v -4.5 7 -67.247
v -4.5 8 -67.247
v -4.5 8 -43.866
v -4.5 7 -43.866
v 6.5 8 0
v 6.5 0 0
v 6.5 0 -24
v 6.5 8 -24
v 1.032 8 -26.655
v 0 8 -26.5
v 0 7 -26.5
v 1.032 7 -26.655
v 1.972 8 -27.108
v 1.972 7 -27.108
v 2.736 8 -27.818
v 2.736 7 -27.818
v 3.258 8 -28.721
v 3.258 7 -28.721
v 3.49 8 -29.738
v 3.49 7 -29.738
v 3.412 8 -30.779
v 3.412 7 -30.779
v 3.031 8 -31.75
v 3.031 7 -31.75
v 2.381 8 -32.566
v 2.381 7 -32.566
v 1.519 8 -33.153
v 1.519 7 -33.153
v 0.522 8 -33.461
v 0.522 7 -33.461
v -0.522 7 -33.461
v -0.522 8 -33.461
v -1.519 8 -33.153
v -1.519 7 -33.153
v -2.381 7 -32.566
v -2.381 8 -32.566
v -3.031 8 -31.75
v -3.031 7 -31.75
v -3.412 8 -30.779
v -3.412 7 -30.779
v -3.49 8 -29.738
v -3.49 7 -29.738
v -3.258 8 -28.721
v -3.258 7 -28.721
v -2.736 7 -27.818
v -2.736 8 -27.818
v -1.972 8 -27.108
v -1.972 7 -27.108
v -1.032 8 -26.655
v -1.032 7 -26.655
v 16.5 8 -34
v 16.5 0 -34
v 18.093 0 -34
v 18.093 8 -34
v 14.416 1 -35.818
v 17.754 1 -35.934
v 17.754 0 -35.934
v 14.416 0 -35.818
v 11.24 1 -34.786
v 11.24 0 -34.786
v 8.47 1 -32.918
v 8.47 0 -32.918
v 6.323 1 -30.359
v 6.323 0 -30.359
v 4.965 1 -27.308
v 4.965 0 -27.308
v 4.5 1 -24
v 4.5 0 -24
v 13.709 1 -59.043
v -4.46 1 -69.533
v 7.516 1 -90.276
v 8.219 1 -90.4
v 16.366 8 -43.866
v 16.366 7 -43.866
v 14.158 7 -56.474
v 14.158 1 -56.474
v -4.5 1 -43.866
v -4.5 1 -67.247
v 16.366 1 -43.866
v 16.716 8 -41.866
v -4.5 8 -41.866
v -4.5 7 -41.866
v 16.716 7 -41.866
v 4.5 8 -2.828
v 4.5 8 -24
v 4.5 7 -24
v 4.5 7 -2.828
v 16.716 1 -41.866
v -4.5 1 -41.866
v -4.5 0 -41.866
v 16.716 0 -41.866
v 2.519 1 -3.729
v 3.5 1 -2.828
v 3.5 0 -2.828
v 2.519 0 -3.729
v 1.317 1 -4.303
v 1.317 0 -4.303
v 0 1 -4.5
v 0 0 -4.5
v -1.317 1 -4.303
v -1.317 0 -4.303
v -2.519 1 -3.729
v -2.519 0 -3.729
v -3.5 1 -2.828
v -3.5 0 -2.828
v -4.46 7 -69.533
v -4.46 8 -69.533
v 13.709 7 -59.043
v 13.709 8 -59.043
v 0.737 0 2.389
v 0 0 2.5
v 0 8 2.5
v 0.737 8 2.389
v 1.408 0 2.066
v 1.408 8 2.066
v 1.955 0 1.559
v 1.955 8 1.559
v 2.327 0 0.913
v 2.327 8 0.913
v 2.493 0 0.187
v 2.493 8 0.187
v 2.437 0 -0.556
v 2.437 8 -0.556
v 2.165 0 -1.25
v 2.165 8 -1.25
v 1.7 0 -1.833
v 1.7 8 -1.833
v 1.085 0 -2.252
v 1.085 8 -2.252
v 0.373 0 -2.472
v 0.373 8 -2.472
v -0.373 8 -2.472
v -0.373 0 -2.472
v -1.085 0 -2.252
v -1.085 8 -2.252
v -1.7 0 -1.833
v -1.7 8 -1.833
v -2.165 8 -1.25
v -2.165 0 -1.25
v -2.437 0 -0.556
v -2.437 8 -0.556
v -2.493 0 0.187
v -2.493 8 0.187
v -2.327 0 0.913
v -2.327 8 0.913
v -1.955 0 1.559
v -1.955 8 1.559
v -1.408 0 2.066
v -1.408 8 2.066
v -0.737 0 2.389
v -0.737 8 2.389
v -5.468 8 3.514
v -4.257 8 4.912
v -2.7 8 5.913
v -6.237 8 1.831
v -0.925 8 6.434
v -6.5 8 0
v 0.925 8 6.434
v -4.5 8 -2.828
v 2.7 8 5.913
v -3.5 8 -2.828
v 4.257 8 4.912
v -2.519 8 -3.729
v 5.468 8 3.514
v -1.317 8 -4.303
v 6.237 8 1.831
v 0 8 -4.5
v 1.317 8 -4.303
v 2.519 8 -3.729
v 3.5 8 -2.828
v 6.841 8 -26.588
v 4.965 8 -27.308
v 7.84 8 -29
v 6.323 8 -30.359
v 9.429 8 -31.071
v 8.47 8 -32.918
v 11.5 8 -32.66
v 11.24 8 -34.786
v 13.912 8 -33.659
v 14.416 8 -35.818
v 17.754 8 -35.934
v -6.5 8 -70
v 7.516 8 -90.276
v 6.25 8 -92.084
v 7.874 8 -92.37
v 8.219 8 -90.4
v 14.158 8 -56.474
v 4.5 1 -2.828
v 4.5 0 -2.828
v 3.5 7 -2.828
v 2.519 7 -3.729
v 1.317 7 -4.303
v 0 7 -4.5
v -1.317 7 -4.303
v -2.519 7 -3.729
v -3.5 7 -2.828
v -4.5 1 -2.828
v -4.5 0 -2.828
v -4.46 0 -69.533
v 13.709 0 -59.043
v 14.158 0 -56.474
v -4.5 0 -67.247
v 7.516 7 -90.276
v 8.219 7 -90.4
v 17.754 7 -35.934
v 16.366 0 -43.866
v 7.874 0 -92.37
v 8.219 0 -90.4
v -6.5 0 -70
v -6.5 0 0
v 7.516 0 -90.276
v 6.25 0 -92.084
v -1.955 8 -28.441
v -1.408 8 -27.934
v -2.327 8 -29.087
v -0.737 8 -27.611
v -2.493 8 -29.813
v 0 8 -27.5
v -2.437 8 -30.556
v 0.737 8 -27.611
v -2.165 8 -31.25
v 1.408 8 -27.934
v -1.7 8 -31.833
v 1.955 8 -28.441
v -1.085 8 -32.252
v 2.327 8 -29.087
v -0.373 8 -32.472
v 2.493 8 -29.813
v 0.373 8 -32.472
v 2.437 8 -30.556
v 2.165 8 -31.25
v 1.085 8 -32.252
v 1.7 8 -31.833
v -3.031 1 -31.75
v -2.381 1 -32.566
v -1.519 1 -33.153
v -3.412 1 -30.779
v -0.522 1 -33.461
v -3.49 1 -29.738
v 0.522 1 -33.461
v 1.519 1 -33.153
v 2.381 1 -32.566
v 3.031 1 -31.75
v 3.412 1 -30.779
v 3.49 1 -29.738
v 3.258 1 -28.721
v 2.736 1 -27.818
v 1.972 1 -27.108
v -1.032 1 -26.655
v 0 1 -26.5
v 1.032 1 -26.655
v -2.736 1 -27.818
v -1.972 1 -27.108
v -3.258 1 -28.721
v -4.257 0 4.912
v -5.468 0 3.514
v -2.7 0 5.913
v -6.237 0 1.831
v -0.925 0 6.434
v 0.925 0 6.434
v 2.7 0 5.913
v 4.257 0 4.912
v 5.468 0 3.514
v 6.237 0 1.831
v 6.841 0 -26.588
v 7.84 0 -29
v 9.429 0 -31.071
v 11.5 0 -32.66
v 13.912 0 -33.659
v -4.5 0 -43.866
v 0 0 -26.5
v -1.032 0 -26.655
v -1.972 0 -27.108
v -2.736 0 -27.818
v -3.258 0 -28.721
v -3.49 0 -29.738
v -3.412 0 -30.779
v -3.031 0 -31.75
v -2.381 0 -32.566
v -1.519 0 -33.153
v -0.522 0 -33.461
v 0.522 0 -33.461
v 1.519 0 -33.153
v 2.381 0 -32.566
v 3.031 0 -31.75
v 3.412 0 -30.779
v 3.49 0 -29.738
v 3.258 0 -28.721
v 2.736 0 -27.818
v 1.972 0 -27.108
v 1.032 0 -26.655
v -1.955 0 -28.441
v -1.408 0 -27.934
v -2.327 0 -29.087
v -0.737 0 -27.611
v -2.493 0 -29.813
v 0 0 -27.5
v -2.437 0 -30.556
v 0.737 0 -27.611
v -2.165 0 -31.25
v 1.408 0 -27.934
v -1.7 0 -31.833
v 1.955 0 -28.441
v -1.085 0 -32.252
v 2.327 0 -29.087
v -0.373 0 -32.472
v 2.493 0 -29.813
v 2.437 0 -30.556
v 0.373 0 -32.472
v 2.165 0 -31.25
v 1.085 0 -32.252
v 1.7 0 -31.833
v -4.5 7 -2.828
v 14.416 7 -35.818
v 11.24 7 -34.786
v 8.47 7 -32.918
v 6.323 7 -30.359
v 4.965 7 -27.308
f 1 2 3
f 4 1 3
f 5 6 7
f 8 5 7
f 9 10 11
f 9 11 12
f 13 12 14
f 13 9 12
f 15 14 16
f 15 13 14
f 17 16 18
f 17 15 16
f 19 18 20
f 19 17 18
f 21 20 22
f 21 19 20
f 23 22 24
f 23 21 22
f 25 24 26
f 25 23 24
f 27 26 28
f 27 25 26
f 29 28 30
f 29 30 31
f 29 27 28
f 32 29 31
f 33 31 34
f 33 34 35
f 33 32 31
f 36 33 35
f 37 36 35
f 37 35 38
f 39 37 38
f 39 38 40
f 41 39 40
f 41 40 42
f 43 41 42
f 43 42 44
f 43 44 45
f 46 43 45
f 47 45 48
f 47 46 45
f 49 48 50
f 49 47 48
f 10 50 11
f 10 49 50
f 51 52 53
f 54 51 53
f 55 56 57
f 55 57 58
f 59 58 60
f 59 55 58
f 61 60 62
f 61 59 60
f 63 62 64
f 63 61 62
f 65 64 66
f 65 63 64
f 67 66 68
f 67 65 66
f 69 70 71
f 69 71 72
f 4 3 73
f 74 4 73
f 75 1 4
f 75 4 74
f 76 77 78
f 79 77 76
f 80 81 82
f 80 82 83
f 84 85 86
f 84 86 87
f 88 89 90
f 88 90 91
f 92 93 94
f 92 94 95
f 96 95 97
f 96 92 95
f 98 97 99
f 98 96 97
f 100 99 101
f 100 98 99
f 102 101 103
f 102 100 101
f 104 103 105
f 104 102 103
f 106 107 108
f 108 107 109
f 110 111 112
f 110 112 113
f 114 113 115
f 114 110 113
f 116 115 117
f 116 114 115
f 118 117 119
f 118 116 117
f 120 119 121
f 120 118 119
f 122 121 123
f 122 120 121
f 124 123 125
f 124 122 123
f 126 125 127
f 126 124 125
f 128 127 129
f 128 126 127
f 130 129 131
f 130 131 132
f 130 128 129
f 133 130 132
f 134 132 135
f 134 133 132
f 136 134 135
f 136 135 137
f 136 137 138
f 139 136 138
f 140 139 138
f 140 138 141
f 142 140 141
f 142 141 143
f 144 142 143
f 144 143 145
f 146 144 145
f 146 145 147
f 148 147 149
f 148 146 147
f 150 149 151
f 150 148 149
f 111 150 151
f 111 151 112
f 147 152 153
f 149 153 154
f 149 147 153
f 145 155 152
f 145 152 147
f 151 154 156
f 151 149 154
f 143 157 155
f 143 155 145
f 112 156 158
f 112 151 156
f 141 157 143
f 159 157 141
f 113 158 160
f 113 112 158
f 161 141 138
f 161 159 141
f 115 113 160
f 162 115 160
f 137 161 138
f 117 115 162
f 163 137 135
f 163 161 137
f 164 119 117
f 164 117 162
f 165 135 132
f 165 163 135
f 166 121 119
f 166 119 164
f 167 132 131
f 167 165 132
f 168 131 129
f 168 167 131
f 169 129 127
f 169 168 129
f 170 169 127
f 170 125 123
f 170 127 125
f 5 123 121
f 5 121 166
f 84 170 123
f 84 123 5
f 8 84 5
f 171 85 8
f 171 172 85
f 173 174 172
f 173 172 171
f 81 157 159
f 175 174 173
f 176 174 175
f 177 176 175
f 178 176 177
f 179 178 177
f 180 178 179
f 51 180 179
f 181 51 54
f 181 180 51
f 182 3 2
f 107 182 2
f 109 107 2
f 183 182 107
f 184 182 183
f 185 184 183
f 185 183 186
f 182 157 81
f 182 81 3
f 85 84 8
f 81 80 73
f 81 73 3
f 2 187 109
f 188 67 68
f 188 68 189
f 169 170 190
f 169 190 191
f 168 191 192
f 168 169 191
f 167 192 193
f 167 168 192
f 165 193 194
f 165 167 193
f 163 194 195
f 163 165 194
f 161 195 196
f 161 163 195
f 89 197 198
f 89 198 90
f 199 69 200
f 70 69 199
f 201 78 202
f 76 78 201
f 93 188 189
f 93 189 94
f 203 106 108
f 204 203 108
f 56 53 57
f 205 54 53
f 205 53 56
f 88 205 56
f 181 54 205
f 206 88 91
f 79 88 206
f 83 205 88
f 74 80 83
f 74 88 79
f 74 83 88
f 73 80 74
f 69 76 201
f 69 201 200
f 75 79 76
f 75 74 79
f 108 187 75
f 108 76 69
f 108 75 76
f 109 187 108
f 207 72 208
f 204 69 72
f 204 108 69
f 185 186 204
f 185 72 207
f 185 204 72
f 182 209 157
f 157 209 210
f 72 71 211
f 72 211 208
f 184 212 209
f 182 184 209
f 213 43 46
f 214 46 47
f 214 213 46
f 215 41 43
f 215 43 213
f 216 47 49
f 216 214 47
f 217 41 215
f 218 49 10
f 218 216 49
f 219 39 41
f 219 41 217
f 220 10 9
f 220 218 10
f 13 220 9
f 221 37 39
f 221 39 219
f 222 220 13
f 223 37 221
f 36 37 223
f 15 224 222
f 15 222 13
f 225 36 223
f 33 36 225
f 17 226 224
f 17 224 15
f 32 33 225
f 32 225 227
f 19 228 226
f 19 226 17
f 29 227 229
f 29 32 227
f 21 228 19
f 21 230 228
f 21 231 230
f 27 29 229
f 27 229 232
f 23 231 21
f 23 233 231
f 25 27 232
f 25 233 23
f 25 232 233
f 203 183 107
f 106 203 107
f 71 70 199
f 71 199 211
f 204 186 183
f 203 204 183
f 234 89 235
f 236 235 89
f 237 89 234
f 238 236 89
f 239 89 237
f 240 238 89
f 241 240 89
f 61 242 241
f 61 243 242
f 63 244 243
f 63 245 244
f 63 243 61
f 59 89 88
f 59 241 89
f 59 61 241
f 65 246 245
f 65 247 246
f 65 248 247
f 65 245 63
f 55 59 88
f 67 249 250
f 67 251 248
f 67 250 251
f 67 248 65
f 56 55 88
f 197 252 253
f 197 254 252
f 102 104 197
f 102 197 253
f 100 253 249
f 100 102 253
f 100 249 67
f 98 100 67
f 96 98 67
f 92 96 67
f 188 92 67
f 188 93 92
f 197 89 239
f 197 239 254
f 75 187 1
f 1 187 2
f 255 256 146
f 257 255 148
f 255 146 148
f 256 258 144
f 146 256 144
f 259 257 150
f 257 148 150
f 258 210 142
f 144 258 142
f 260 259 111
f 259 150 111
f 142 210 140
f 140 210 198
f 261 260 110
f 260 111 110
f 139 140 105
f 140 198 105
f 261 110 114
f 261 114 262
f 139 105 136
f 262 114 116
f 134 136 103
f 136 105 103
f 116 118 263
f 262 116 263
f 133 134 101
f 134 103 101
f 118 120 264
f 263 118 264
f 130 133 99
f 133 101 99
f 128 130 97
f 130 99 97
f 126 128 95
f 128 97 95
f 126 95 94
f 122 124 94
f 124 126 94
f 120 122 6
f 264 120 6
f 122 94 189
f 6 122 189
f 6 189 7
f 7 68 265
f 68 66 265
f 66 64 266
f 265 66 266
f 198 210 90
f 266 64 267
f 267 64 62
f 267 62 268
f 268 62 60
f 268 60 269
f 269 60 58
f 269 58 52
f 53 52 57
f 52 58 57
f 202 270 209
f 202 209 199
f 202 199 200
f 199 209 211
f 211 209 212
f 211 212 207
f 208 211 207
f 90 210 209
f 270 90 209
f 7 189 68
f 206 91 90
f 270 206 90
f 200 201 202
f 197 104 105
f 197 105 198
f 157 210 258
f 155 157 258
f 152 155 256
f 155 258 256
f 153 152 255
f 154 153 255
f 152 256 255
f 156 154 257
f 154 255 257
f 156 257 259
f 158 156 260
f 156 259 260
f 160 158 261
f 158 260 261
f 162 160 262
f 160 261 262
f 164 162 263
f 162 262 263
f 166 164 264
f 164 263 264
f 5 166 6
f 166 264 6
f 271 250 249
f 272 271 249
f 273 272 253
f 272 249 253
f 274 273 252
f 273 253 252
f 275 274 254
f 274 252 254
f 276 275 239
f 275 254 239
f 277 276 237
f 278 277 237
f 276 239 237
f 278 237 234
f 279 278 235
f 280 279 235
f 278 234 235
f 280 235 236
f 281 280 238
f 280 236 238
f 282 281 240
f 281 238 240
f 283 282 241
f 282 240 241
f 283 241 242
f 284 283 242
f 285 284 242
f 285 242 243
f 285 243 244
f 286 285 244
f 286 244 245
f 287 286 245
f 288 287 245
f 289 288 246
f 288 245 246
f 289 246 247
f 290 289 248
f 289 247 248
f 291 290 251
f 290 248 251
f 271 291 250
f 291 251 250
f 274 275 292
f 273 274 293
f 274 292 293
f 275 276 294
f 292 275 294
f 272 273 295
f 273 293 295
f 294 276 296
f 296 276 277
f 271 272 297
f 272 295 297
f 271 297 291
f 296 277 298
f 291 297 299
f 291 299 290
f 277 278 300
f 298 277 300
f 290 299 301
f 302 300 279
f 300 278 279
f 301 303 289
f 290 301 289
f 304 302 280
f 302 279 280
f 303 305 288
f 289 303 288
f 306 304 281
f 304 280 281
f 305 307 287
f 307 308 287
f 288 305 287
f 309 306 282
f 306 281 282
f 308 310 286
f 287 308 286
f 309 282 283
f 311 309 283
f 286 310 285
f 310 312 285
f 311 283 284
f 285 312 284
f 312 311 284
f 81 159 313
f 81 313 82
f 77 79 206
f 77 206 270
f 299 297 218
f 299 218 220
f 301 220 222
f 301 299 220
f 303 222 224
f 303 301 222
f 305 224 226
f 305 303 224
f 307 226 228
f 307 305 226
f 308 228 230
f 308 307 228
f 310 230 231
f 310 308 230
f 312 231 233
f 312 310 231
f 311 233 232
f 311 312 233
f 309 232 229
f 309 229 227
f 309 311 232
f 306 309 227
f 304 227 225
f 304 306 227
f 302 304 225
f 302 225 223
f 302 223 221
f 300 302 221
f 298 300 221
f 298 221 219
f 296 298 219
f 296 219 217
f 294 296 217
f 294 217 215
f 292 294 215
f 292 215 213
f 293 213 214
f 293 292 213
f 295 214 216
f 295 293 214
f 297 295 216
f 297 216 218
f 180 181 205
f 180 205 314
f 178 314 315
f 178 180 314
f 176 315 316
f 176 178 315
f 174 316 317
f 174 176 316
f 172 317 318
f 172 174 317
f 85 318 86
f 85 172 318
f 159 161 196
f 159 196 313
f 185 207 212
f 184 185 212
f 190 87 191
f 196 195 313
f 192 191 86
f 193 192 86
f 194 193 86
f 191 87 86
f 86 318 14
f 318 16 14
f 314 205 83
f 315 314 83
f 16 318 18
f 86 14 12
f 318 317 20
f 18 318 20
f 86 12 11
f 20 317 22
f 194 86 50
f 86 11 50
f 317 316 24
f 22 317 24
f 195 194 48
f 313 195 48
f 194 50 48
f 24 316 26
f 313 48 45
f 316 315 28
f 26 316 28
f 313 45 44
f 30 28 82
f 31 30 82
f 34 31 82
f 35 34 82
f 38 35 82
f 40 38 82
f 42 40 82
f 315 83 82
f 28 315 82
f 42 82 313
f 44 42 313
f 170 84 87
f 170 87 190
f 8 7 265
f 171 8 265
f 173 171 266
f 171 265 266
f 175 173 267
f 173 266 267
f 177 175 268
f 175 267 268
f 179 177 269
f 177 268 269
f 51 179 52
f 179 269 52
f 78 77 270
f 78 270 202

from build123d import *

# Parameters (mm, degrees)
CROQUIS2_R               = 2.5
SALIENTE_EXTRUIR1_DEPTH  = 8
CROQUIS3_R               = 3.5
CORTAR_EXTRUIR1_DEPTH    = 1
CORTAR_EXTRUIR2_START    = -1
CROQUIS4_R               = 3.5
CORTAR_EXTRUIR2_DEPTH    = 1
BOSS_EXTRUDE1_DEPTH      = 10
BOSS_EXTRUDE1_DEPTH_BACK = 18
CUT_EXTRUDE1_DEPTH       = 10
CUT_EXTRUDE2_DEPTH       = 46
CUT_EXTRUDE2_DEPTH_BACK  = 31


with BuildPart() as part:
    # Croquis2 → Saliente-Extruir1 (new body)
    with BuildSketch(Plane(origin=(0, 0, 0), x_dir=(1, 0, 0), z_dir=(0, 1, 0))):
        with BuildLine():
            Line((-6.5, 70), (-6.5, 0))
            ThreePointArc((-6.5, 0), (0, -6.5), (6.5, 0))
            Line((6.5, 0), (6.5, 24))
            ThreePointArc((6.5, 24), (9.428932188, 31.071067812), (16.5, 34))
            Line((16.5, 34), (19.5, 34))
            Line((19.5, 34), (21.621320344, 36.121320344))
            Line((21.621320344, 36.121320344), (19.621320344, 38.121320344))
            Line((19.621320344, 38.121320344), (21.621320344, 40.121320344))
            Line((21.621320344, 40.121320344), (19.621320344, 42.121320344))
            Line((19.621320344, 42.121320344), (21.621320344, 44.121320344))
            ThreePointArc((21.621320344, 44.121320344), (15.831267135, 61.441250358), (13.535653981, 79.558503244))
            Line((13.535653981, 79.558503244), (11.21874212, 81.180822395))
            Line((11.21874212, 81.180822395), (12.841061271, 83.497734256))
            Line((12.841061271, 83.497734256), (10.524149409, 85.120053407))
            Line((10.524149409, 85.120053407), (12.14646856, 87.436965268))
            Line((12.14646856, 87.436965268), (9.829556699, 89.059284419))
            Line((9.829556699, 89.059284419), (11.451875849, 91.37619628))
            Line((11.451875849, 91.37619628), (11.174038765, 92.951888685))
            Line((11.174038765, 92.951888685), (6.25, 92.083647797))
            Line((6.25, 92.083647797), (-6.5, 70))
        make_face()
        with Locations(Location((0, 0, 0), (0, 0, 270))):
            Circle(CROQUIS2_R, mode=Mode.SUBTRACT)
        with Locations(Location((0, 30, 0), (0, 0, 270))):
            Circle(CROQUIS2_R, mode=Mode.SUBTRACT)
    extrude(amount=SALIENTE_EXTRUIR1_DEPTH)

    # Croquis3 → Cortar-Extruir1 (cut)
    # profile 1 of 3: a face of its own
    with BuildSketch(Plane(origin=(0, 8, 0), x_dir=(1, 0, 0), z_dir=(0, 1, 0))):
        with BuildLine():
            Line((7.515743149, 90.275979241), (-4.460249568, 69.532951382))
            Line((-4.460249568, 69.532951382), (14.458313138, 58.610314111))
            ThreePointArc((14.458313138, 58.610314111), (13.59841994, 62.277167356), (12.884475402, 65.975209032))
            Line((12.884475402, 65.975209032), (8.566911861, 90.461328646))
            Line((8.566911861, 90.461328646), (7.515743149, 90.275979241))
        make_face()
    # profile 2 of 3: a face of its own
    with BuildSketch(Plane(origin=(0, 8, 0), x_dir=(1, 0, 0), z_dir=(0, 1, 0))):
        with BuildLine():
            Line((-4.5, 67.246500228), (-4.5, 43.866114746))
            Line((-4.5, 43.866114746), (18.28754604, 43.866114746))
            Line((18.28754604, 43.866114746), (18.28754604, 46.866114746))
            ThreePointArc((18.28754604, 46.866114746), (16.631849149, 51.330235949), (15.201783832, 55.871670029))
            Line((15.201783832, 55.871670029), (-4.5, 67.246500228))
        make_face()
    # profile 3 of 3: a face of its own
    with BuildSketch(Plane(origin=(0, 8, 0), x_dir=(1, 0, 0), z_dir=(0, 1, 0))):
        with BuildLine():
            Line((-4.5, 2.828427125), (-4.5, 41.866114746))
            Line((-4.5, 41.866114746), (18.28754604, 41.866114746))
            Line((18.28754604, 41.866114746), (18.28754604, 35.866114746))
            ThreePointArc((18.28754604, 35.866114746), (8.672182695, 33.095343657), (4.5, 24))
            Line((4.5, 24), (4.5, 2.828427125))
            Line((4.5, 2.828427125), (3.5, 2.828427125))
            ThreePointArc((3.5, 2.828427125), (0, 4.5), (-3.5, 2.828427125))
            Line((-3.5, 2.828427125), (-4.5, 2.828427125))
        make_face()
        with Locations(Location((0, 30, 0), (0, 0, 270))):
            Circle(CROQUIS3_R, mode=Mode.SUBTRACT)
    extrude(amount=-CORTAR_EXTRUIR1_DEPTH, mode=Mode.SUBTRACT)

    # Croquis4 → Cortar-Extruir2 (cut)
    # profile 1 of 3: a face of its own
    with BuildSketch(Plane.XZ.offset(CORTAR_EXTRUIR2_START)):
        with BuildLine():
            Line((4.5, -24), (4.5, -2.828427125))
            Line((4.5, -2.828427125), (3.5, -2.828427125))
            ThreePointArc((3.5, -2.828427125), (0, -4.5), (-3.5, -2.828427125))
            Line((-3.5, -2.828427125), (-4.5, -2.828427125))
            Line((-4.5, -2.828427125), (-4.5, -41.866114746))
            Line((-4.5, -41.866114746), (18.28754604, -41.866114746))
            Line((18.28754604, -41.866114746), (18.28754604, -35.866114746))
            ThreePointArc((18.28754604, -35.866114746), (8.672182695, -33.095343657), (4.5, -24))
        make_face()
        with Locations(Location((0, -30, 0), (0, 0, 90))):
            Circle(CROQUIS4_R, mode=Mode.SUBTRACT)
    # profile 2 of 3: a face of its own
    with BuildSketch(Plane.XZ.offset(CORTAR_EXTRUIR2_START)):
        with BuildLine():
            Line((14.458313138, -58.610314111), (-4.460249568, -69.532951382))
            Line((-4.460249568, -69.532951382), (7.515743149, -90.275979241))
            Line((7.515743149, -90.275979241), (8.566911861, -90.461328646))
            Line((8.566911861, -90.461328646), (12.884475402, -65.975209032))
            ThreePointArc((12.884475402, -65.975209032), (13.59841994, -62.277167356), (14.458313138, -58.610314111))
        make_face()
    # profile 3 of 3: a face of its own
    with BuildSketch(Plane.XZ.offset(CORTAR_EXTRUIR2_START)):
        with BuildLine():
            Line((-4.5, -67.246500228), (15.201783832, -55.871670029))
            ThreePointArc((15.201783832, -55.871670029), (16.631849149, -51.330235949), (18.28754604, -46.866114746))
            Line((18.28754604, -46.866114746), (18.28754604, -43.866114746))
            Line((18.28754604, -43.866114746), (-4.5, -43.866114746))
            Line((-4.5, -43.866114746), (-4.5, -67.246500228))
        make_face()
    extrude(amount=CORTAR_EXTRUIR2_DEPTH, mode=Mode.SUBTRACT)

    # Sketch1 → Boss-Extrude1 (add, two sides: drawn at the far end of the back side and taken through both)
    with BuildSketch(Plane(origin=(0, 0, 0), x_dir=(-1, 0, 0), z_dir=(0, -1, 0)).offset(-BOSS_EXTRUDE1_DEPTH_BACK)):
        Polygon((-10.725693632, 78.218268839), (-13.535653981, 79.558503244), (-11.21874212, 81.180822395), (-12.841061271, 83.497734256), (-10.524149409, 85.120053407), (-12.14646856, 87.436965268), (-9.829556699, 89.059284419), (-11.451875849, 91.37619628), (-11.174038765, 92.951888685), (-8.712019383, 92.517768241), align=None)
    extrude(amount=BOSS_EXTRUDE1_DEPTH + BOSS_EXTRUDE1_DEPTH_BACK)

    # Sketch2 → Cut-Extrude1 (cut)
    with BuildSketch(Plane.XZ):
        Polygon((20.854717439, -45.882271987), (20.061595797, -46.675393628), (20.061595797, -47.817063384), (19.020844567, -48.857814614), (19.213403829, -50.036558505), (18.345213154, -50.90474918), (18.63507803, -51.655887227), (18.345213154, -51.655887227), (18.345213154, -52.50502864), (17.475337304, -52.840714546), (17.942236404, -53.732571601), (17.475337304, -53.732571601), (17.731860677, -54.397310522), (17.060300562, -55.068870638), (17.333638858, -55.705905614), (17.060300562, -55.705905614), (17.060300562, -56.646563198), (16.631849149, -57.159208559), (16.631849149, -58.201545628), (15.831267135, -59.159448073), (16.233608031, -59.750840851), (15.363432322, -60.342845501), (15.831267135, -61.441250358), (15.015003687, -61.996577004), (15.474048684, -63.074344715), (14.594646883, -63.672626132), (15.180653556, -64.533985534), (14.340267552, -65.105723423), (14.855378114, -66.315124537), (13.915417538, -66.954605767), (14.589004763, -67.944698058), (13.915417538, -68.402958115), (14.367306345, -69.46392418), (13.490959077, -70.060127513), (14.163271241, -71.048345618), (13.268305135, -72.119179344), (13.978614858, -72.712831852), (13.268305135, -73.562722816), (13.824014096, -74.379548221), (13.268305135, -74.757612427), (13.740518299, -75.451709043), (12.802233755, -76.090050022), (13.62576872, -77.300547474), (12.802233755, -77.860821134), (13.553992685, -78.96581644), align=None)
    extrude(amount=-CUT_EXTRUDE1_DEPTH, mode=Mode.SUBTRACT)

    # Sketch3 → Cut-Extrude2 (cut, two sides: drawn at the far end of the back side and taken through both)
    with BuildSketch(Plane(origin=(0, 1, 0), x_dir=(-1, 0, 0), z_dir=(0, -1, 0)).offset(-CUT_EXTRUDE2_DEPTH_BACK)):
        Polygon((-19.61873043, 25.285830451), (-7.041341817, 97.124082603), (-21.40830892, 99.639440689), (-35.796516216, 28.118225347), align=None)
    extrude(amount=CUT_EXTRUDE2_DEPTH + CUT_EXTRUDE2_DEPTH_BACK, mode=Mode.SUBTRACT)


solid = part.part
